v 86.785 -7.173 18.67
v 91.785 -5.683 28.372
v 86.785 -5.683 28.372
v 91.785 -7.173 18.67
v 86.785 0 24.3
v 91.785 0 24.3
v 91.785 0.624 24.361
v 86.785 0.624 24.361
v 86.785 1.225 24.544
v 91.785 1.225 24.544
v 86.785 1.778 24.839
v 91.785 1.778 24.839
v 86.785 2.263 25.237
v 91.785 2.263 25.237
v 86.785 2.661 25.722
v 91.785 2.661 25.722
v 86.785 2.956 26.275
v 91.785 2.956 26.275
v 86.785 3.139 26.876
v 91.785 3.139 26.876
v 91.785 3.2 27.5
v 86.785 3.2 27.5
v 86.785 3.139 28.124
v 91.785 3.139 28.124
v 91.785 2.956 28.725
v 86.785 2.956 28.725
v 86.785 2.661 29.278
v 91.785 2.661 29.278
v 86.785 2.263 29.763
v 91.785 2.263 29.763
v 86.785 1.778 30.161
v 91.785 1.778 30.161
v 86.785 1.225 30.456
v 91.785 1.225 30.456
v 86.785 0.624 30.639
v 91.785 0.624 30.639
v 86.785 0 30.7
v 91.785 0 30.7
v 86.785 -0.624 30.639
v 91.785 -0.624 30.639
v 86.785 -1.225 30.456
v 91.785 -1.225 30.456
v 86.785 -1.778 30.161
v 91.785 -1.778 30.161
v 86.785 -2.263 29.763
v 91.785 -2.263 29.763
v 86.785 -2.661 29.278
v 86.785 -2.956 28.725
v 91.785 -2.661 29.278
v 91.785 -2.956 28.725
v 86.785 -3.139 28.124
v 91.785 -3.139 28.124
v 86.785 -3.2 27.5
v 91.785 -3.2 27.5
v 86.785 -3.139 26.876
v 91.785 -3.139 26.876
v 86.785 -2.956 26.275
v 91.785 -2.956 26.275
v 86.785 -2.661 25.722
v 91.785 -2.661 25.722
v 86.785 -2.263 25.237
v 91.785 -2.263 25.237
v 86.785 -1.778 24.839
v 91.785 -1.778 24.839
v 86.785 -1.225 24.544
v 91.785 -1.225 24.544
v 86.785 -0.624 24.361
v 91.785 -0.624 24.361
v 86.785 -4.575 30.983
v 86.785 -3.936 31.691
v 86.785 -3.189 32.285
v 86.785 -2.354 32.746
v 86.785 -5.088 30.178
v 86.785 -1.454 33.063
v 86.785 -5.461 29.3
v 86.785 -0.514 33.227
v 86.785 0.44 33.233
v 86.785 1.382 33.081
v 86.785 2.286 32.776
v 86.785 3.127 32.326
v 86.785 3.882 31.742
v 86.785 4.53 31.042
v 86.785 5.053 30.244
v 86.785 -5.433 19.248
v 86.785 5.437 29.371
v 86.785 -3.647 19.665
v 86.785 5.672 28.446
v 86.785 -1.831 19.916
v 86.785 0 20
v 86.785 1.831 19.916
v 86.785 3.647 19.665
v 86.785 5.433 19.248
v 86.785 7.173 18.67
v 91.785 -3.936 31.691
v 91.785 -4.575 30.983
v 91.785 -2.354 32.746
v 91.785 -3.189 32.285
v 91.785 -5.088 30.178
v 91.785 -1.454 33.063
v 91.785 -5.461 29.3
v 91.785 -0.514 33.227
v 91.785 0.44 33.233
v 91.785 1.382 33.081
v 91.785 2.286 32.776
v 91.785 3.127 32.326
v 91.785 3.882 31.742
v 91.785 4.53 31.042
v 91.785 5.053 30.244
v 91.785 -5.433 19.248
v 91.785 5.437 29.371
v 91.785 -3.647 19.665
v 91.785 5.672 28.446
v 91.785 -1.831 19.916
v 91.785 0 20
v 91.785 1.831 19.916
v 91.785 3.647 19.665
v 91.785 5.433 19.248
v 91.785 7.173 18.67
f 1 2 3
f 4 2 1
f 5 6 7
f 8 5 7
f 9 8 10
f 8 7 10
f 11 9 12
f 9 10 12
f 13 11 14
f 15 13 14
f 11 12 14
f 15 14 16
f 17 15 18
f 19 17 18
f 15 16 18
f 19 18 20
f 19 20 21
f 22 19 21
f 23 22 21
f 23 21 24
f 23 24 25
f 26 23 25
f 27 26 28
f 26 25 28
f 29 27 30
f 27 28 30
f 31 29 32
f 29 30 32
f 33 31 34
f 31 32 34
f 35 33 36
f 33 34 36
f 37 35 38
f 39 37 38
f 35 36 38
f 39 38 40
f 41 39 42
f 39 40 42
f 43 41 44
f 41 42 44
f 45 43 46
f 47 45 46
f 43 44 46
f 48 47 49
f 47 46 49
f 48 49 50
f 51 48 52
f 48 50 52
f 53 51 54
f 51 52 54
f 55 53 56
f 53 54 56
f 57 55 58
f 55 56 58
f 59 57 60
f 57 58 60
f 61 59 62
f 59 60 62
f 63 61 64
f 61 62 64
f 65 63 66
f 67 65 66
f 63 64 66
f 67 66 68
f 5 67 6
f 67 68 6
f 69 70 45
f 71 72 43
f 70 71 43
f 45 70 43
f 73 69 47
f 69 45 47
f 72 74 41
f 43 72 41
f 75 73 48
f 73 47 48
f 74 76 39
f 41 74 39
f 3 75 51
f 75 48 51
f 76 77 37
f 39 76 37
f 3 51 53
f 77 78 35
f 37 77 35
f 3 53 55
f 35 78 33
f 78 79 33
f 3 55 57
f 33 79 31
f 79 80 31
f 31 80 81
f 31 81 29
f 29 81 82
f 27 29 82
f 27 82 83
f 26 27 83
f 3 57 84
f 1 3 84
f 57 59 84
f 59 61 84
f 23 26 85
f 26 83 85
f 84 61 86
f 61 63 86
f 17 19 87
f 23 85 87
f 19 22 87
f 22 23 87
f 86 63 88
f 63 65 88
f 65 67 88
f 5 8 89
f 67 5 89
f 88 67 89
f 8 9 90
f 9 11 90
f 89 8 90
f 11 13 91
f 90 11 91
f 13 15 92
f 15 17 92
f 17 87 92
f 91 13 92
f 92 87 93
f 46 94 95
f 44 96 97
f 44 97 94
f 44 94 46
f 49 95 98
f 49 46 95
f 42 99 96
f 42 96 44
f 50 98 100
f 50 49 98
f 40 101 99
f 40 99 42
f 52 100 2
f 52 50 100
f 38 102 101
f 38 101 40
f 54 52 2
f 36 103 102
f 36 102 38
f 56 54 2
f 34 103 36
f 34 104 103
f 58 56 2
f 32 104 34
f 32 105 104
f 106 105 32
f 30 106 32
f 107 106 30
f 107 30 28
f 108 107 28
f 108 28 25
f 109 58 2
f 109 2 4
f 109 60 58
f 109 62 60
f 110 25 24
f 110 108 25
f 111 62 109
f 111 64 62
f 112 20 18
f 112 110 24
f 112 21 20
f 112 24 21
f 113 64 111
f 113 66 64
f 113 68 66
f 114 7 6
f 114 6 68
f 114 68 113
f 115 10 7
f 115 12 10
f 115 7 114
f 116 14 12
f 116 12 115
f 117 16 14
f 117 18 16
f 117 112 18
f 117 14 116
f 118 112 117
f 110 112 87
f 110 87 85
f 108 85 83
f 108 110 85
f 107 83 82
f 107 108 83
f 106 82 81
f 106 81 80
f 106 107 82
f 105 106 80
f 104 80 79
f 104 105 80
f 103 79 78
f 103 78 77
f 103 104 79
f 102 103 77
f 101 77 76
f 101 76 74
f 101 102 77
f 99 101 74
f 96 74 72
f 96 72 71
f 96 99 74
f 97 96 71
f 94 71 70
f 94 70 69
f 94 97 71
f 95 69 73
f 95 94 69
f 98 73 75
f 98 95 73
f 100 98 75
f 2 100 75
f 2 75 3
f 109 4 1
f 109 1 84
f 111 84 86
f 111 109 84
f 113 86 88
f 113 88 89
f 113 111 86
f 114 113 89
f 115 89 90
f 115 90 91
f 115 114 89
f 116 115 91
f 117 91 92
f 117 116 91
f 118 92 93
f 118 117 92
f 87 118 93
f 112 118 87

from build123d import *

# Parameters (mm, degrees)
SZKIC19_R                   = 3.2
DODANIE_WYCI_GNI_CIE4_DEPTH = 5


with BuildPart() as part:
    # Szkic19 → Dodanie-wyciągnięcie4 (new body)
    with BuildSketch(Plane(origin=(91.785447504, 0, 0), x_dir=(0, 0, -1), z_dir=(1, 0, 0))):
        with BuildLine():
            ThreePointArc((-28.445954588, 5.671654954), (-33.249878941, -0.037311688), (-28.372269859, -5.683453641))
            Line((-28.372269859, -5.683453641), (-18.66960621, -7.172573037))
            ThreePointArc((-18.66960621, -7.172573037), (-20, 0), (-18.66960621, 7.172573037))
            Line((-18.66960621, 7.172573037), (-28.445954588, 5.671654954))
        make_face()
        with Locations((-27.5, 0)):
            Circle(SZKIC19_R, mode=Mode.SUBTRACT)
    extrude(amount=-DODANIE_WYCI_GNI_CIE4_DEPTH)


solid = part.part
